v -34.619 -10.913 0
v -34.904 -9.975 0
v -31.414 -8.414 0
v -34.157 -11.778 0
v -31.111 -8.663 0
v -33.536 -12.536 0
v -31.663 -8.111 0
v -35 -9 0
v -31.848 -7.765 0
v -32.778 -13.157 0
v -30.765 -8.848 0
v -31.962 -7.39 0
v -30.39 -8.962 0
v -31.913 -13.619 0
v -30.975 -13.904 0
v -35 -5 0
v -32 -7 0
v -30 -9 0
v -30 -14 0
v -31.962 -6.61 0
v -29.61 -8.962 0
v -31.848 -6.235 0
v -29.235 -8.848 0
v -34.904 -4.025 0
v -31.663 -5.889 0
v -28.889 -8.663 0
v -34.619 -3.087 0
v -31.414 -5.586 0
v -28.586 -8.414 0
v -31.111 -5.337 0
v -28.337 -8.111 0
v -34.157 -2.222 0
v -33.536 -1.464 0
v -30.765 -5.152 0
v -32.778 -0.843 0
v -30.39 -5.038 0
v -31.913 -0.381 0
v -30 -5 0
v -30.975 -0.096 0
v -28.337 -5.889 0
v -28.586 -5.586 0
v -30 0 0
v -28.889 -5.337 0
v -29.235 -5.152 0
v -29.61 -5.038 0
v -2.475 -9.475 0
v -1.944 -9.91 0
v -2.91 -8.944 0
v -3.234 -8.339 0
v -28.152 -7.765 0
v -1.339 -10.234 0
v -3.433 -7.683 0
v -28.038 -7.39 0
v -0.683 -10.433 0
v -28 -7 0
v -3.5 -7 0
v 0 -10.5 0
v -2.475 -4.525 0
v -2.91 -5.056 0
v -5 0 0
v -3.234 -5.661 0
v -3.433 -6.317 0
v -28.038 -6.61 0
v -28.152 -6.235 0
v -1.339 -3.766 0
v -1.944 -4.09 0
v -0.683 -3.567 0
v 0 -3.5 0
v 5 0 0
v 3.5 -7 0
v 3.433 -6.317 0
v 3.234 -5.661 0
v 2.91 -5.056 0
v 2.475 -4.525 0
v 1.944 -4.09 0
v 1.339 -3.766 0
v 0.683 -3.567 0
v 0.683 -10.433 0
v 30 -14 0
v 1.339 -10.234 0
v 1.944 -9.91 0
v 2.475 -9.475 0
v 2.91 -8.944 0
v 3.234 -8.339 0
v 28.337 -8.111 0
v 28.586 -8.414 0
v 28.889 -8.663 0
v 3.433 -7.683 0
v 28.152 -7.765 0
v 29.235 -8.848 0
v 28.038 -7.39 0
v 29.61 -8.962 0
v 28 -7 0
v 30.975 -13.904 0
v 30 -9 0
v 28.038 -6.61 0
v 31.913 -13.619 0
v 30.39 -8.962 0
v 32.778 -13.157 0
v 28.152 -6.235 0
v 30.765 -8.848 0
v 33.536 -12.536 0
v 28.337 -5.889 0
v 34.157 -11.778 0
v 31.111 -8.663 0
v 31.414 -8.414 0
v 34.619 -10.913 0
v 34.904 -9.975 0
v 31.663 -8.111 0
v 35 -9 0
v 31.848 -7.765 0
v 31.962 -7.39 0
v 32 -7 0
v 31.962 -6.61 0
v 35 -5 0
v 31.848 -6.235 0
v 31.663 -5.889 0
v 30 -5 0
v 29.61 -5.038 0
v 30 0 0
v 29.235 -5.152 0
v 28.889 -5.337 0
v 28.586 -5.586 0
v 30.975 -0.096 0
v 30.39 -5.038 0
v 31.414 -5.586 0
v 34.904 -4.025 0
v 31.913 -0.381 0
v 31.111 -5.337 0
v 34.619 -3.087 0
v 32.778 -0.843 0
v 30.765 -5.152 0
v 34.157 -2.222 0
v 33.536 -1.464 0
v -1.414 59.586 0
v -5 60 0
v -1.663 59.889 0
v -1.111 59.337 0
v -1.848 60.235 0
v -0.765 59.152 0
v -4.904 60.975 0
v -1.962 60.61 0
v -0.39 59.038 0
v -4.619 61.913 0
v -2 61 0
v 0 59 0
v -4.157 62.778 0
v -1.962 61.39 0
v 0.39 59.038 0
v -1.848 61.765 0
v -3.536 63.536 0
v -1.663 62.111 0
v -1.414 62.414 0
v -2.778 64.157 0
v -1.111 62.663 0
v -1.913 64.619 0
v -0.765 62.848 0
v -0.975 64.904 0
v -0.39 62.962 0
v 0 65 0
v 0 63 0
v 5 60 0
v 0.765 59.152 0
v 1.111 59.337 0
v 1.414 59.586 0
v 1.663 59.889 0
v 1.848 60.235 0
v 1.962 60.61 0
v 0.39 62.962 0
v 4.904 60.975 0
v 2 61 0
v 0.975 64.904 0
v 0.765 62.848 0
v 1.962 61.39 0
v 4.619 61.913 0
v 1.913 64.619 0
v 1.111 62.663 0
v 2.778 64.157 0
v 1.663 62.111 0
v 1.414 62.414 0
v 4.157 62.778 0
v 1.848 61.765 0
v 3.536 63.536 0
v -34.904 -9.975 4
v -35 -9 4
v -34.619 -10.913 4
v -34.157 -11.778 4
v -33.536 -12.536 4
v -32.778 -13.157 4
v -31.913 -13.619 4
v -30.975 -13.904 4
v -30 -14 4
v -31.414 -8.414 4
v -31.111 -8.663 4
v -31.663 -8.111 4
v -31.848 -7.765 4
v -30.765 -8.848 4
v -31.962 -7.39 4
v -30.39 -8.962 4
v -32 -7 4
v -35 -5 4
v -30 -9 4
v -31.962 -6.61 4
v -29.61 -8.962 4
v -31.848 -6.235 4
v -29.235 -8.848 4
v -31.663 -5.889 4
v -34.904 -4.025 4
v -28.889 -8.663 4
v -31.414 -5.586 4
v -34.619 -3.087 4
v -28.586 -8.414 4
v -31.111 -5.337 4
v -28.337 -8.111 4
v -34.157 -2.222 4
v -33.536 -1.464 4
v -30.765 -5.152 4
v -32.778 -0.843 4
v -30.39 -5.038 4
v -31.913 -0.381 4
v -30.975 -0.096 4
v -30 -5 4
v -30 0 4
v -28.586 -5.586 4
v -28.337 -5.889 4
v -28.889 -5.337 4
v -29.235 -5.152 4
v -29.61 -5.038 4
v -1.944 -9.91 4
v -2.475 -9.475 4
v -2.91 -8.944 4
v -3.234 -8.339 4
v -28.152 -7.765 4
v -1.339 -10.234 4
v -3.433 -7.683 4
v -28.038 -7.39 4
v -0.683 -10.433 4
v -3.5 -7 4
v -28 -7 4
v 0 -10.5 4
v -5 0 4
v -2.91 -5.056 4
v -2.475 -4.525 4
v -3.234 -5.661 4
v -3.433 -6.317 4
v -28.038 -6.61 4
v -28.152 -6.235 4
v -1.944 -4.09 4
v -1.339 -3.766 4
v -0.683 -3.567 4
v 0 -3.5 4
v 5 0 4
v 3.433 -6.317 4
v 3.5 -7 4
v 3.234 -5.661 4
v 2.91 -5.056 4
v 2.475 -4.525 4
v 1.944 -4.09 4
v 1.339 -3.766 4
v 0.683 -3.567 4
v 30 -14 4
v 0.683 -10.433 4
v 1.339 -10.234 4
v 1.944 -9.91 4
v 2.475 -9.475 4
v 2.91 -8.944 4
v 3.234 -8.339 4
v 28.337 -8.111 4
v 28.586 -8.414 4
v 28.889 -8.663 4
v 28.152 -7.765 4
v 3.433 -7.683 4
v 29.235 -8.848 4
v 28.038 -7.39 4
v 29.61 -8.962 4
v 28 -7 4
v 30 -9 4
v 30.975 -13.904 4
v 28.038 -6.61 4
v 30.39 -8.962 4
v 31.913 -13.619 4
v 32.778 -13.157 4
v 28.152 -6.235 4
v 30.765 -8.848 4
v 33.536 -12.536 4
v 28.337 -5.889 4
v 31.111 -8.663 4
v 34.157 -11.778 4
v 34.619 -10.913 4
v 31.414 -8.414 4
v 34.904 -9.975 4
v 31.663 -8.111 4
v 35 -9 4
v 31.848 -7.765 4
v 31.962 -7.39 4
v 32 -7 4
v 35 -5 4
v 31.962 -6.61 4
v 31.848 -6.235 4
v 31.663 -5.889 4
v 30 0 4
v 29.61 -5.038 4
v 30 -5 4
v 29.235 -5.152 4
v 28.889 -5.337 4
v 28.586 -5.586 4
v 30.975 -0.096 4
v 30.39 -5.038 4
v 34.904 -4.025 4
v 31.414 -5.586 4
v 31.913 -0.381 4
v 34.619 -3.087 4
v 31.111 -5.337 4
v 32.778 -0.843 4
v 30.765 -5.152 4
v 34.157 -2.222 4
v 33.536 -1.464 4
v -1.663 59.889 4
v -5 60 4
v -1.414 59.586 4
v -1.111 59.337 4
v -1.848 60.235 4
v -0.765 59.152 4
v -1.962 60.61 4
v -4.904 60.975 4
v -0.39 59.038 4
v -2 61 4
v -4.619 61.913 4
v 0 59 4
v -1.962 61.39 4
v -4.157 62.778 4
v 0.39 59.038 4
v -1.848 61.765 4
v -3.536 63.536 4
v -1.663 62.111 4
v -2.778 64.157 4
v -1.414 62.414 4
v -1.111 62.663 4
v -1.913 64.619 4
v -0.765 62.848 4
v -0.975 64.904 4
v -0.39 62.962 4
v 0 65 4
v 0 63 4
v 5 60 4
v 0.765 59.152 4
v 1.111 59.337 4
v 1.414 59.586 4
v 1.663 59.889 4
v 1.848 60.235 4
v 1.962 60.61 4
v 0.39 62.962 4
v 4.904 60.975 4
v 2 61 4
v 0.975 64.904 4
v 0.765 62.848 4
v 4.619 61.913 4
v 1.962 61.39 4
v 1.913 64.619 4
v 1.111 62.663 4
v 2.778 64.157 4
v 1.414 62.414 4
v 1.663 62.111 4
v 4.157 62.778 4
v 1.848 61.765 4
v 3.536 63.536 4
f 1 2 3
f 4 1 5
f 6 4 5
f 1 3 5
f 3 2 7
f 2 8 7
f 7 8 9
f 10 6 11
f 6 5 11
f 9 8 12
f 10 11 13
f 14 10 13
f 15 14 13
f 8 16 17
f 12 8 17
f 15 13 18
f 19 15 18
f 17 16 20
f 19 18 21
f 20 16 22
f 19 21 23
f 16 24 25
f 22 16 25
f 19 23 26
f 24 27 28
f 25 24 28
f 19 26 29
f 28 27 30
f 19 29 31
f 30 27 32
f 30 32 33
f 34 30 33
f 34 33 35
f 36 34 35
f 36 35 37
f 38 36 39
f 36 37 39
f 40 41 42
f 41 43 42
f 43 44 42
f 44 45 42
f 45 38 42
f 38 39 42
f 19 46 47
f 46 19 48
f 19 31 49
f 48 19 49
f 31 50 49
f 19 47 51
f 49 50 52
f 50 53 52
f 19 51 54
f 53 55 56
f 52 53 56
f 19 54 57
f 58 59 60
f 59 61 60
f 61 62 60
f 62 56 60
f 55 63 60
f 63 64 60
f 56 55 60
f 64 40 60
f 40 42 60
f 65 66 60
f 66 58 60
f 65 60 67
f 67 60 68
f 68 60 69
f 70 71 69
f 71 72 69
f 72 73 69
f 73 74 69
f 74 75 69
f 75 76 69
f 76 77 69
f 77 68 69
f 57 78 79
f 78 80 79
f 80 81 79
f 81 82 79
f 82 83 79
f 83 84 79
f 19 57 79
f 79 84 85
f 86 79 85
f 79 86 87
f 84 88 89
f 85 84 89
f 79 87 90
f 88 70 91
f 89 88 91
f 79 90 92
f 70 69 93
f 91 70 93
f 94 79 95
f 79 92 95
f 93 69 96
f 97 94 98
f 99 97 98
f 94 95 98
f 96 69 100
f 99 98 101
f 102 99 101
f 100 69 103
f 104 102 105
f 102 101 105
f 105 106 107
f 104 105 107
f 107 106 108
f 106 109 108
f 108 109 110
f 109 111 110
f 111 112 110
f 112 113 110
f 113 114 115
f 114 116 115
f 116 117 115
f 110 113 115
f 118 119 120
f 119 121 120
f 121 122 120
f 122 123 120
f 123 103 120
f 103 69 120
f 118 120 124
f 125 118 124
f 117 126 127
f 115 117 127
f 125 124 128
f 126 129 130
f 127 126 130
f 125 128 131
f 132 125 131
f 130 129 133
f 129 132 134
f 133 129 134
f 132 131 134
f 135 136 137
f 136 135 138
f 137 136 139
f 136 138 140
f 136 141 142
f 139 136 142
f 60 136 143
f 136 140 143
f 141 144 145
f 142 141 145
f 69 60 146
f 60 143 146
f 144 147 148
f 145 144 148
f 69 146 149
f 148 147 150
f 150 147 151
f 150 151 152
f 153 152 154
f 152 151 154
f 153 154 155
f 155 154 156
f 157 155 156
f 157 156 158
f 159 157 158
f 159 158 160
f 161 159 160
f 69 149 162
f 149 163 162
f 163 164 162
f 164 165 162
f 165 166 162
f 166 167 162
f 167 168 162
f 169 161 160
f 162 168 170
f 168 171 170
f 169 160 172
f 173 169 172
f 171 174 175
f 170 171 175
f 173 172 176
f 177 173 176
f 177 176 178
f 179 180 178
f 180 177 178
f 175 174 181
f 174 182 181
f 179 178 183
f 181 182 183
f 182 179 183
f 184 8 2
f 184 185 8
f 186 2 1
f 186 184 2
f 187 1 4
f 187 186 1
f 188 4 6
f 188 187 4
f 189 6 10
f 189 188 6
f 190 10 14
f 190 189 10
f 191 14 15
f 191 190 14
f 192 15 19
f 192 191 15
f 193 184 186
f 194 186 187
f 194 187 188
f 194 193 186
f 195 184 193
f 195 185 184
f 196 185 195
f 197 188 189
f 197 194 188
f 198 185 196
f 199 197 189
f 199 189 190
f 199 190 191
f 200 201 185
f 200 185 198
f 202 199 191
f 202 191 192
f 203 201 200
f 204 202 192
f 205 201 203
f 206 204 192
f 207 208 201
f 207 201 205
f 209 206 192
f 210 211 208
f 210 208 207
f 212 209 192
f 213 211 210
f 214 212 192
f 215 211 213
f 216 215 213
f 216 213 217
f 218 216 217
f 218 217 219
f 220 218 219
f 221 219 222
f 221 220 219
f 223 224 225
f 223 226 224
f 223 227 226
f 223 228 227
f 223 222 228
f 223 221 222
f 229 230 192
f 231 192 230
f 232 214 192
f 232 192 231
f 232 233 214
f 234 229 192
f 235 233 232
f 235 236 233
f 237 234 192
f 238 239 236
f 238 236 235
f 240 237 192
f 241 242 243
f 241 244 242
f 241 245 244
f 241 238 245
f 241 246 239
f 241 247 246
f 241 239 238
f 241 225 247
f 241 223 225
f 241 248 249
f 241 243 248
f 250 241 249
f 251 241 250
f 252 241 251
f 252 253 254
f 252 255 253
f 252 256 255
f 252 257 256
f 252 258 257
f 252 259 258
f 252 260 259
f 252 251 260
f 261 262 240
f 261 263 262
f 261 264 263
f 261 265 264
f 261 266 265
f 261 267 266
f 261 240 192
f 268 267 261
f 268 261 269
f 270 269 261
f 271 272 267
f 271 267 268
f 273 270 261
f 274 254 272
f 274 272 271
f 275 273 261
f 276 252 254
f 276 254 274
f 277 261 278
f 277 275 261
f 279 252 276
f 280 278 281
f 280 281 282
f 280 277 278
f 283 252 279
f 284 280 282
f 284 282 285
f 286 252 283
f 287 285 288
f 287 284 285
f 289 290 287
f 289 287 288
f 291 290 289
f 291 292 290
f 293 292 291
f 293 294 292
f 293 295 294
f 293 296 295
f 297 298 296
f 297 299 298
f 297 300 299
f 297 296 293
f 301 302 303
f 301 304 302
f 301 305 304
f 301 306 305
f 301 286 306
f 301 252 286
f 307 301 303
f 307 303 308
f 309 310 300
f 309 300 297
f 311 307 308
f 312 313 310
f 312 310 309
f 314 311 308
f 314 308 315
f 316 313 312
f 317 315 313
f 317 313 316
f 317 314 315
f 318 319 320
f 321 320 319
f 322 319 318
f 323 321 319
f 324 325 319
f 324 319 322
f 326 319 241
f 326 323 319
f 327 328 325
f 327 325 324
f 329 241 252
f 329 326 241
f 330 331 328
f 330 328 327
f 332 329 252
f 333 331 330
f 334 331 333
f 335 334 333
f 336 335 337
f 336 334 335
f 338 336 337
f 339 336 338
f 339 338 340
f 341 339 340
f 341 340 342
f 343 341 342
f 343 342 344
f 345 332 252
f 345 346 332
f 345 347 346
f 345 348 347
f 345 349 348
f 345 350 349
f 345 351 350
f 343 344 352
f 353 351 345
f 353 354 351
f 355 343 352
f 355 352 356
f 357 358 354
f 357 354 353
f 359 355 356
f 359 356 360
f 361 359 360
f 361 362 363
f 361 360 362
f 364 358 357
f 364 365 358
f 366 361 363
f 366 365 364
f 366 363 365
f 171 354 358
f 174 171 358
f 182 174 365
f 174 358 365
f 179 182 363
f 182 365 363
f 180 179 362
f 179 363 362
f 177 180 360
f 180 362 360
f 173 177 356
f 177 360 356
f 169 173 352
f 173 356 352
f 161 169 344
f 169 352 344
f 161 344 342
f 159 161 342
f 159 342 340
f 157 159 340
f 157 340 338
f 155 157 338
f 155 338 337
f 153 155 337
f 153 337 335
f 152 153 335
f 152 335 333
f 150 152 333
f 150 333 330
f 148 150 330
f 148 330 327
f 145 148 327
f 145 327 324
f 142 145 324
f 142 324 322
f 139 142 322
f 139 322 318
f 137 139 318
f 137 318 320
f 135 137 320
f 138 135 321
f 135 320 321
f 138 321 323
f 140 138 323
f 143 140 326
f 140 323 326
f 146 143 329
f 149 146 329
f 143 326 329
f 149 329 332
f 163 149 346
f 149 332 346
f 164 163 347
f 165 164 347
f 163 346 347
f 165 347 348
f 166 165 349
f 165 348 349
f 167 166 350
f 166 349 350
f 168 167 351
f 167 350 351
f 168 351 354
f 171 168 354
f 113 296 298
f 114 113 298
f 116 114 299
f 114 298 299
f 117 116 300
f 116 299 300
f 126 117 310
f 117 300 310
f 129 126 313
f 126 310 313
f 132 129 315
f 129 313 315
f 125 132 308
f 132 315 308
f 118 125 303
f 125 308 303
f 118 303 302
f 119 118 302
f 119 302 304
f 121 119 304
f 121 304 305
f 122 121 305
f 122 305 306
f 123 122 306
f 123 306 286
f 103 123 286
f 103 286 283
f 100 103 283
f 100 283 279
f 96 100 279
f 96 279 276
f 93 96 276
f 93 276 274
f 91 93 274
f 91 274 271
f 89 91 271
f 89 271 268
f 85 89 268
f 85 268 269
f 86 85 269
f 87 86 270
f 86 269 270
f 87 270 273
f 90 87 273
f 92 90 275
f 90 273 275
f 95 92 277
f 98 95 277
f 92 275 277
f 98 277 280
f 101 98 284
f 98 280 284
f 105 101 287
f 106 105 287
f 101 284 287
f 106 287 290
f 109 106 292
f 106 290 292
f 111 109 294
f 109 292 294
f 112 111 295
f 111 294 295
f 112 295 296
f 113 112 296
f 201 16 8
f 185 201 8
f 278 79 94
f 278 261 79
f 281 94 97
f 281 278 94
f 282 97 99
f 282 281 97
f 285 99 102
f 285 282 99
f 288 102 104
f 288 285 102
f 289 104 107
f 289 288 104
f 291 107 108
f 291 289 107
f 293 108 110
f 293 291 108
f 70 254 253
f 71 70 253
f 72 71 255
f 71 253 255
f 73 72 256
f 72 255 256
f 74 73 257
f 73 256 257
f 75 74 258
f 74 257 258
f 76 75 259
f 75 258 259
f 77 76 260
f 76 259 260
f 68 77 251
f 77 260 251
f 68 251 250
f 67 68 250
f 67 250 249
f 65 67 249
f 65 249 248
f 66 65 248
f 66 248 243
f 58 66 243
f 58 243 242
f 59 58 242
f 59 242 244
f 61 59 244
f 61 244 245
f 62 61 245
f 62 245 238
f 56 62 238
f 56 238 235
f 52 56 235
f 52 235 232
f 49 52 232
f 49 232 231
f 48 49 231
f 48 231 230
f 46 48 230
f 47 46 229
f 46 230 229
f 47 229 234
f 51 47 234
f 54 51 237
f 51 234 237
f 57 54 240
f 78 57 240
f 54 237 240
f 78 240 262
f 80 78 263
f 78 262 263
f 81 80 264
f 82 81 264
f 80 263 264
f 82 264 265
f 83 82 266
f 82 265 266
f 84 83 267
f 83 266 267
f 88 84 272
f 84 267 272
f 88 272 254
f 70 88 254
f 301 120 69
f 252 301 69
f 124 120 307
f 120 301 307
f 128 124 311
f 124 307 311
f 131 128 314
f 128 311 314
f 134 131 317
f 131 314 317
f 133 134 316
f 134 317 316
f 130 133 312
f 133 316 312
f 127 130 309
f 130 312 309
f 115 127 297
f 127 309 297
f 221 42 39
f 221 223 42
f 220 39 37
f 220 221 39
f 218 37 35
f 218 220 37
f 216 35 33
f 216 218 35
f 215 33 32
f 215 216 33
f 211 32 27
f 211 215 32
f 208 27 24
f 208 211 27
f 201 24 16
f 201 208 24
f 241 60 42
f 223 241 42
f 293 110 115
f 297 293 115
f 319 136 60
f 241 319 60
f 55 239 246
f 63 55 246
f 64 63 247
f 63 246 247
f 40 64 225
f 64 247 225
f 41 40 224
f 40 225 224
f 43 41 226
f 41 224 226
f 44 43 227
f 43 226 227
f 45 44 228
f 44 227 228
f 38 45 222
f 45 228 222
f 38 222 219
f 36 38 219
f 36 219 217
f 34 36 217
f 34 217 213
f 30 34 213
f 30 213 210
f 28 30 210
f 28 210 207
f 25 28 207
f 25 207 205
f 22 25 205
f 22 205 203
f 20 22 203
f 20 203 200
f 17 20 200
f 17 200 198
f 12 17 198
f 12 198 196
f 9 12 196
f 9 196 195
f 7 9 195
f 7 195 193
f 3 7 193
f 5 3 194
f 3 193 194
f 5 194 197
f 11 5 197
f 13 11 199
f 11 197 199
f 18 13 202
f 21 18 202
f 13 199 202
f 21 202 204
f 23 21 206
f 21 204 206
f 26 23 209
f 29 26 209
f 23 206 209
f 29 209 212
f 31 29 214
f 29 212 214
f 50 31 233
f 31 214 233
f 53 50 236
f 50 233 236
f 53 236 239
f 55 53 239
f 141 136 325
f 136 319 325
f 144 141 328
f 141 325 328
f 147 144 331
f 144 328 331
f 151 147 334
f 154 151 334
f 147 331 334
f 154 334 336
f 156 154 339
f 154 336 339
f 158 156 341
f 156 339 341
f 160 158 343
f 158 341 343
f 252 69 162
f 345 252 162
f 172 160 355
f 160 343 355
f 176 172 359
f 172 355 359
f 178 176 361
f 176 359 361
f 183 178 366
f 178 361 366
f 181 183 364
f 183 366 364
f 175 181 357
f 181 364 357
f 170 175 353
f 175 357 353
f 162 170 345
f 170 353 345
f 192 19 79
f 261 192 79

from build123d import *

# Parameters (mm, degrees)
F1_DEPTH = 4
F2_R     = 2
F2_R_2   = 3.5
F3_DEPTH = 25
F4_R     = 4.99999


# Not quite as in the source:
# - a fillet or chamfer is up to 0.001 mm smaller than in the source, because OpenCascade refuses the exact size


with BuildPart() as f1:
    # F0 (on Top) → F1 (new body)
    with BuildSketch(Plane.XY):
        Polygon((-5, 65), (-5, 0), (-35, 0), (-35, -14), (35, -14), (35, 0), (5, 0), (5, 65), align=None)
    extrude(amount=F1_DEPTH)

    # F2 (on face) → F3 (cut)
    with BuildSketch(Plane.XY.offset(4)):
        with Locations((-30, -7)):
            Circle(F2_R)
        with Locations((30, -7)):
            Circle(F2_R)
        with Locations((0, -7)):
            Circle(F2_R_2)
        with Locations((0, 61)):
            Circle(F2_R)
    extrude(amount=-F3_DEPTH, mode=Mode.SUBTRACT)

    # F4 (radius 5 in the source; OpenCascade refuses exactly that, so slightly less here)
    f4_edges = [f1.edges().sort_by_distance(p)[0] for p in [
        (-35, -14, 2),
        (-35, 0, 2),
        (35, -14, 2),
        (35, 0, 2),
        (5, 65, 2),
        (-5, 65, 2),
    ]]
    fillet(f4_edges, radius=F4_R)


solid = f1.part
